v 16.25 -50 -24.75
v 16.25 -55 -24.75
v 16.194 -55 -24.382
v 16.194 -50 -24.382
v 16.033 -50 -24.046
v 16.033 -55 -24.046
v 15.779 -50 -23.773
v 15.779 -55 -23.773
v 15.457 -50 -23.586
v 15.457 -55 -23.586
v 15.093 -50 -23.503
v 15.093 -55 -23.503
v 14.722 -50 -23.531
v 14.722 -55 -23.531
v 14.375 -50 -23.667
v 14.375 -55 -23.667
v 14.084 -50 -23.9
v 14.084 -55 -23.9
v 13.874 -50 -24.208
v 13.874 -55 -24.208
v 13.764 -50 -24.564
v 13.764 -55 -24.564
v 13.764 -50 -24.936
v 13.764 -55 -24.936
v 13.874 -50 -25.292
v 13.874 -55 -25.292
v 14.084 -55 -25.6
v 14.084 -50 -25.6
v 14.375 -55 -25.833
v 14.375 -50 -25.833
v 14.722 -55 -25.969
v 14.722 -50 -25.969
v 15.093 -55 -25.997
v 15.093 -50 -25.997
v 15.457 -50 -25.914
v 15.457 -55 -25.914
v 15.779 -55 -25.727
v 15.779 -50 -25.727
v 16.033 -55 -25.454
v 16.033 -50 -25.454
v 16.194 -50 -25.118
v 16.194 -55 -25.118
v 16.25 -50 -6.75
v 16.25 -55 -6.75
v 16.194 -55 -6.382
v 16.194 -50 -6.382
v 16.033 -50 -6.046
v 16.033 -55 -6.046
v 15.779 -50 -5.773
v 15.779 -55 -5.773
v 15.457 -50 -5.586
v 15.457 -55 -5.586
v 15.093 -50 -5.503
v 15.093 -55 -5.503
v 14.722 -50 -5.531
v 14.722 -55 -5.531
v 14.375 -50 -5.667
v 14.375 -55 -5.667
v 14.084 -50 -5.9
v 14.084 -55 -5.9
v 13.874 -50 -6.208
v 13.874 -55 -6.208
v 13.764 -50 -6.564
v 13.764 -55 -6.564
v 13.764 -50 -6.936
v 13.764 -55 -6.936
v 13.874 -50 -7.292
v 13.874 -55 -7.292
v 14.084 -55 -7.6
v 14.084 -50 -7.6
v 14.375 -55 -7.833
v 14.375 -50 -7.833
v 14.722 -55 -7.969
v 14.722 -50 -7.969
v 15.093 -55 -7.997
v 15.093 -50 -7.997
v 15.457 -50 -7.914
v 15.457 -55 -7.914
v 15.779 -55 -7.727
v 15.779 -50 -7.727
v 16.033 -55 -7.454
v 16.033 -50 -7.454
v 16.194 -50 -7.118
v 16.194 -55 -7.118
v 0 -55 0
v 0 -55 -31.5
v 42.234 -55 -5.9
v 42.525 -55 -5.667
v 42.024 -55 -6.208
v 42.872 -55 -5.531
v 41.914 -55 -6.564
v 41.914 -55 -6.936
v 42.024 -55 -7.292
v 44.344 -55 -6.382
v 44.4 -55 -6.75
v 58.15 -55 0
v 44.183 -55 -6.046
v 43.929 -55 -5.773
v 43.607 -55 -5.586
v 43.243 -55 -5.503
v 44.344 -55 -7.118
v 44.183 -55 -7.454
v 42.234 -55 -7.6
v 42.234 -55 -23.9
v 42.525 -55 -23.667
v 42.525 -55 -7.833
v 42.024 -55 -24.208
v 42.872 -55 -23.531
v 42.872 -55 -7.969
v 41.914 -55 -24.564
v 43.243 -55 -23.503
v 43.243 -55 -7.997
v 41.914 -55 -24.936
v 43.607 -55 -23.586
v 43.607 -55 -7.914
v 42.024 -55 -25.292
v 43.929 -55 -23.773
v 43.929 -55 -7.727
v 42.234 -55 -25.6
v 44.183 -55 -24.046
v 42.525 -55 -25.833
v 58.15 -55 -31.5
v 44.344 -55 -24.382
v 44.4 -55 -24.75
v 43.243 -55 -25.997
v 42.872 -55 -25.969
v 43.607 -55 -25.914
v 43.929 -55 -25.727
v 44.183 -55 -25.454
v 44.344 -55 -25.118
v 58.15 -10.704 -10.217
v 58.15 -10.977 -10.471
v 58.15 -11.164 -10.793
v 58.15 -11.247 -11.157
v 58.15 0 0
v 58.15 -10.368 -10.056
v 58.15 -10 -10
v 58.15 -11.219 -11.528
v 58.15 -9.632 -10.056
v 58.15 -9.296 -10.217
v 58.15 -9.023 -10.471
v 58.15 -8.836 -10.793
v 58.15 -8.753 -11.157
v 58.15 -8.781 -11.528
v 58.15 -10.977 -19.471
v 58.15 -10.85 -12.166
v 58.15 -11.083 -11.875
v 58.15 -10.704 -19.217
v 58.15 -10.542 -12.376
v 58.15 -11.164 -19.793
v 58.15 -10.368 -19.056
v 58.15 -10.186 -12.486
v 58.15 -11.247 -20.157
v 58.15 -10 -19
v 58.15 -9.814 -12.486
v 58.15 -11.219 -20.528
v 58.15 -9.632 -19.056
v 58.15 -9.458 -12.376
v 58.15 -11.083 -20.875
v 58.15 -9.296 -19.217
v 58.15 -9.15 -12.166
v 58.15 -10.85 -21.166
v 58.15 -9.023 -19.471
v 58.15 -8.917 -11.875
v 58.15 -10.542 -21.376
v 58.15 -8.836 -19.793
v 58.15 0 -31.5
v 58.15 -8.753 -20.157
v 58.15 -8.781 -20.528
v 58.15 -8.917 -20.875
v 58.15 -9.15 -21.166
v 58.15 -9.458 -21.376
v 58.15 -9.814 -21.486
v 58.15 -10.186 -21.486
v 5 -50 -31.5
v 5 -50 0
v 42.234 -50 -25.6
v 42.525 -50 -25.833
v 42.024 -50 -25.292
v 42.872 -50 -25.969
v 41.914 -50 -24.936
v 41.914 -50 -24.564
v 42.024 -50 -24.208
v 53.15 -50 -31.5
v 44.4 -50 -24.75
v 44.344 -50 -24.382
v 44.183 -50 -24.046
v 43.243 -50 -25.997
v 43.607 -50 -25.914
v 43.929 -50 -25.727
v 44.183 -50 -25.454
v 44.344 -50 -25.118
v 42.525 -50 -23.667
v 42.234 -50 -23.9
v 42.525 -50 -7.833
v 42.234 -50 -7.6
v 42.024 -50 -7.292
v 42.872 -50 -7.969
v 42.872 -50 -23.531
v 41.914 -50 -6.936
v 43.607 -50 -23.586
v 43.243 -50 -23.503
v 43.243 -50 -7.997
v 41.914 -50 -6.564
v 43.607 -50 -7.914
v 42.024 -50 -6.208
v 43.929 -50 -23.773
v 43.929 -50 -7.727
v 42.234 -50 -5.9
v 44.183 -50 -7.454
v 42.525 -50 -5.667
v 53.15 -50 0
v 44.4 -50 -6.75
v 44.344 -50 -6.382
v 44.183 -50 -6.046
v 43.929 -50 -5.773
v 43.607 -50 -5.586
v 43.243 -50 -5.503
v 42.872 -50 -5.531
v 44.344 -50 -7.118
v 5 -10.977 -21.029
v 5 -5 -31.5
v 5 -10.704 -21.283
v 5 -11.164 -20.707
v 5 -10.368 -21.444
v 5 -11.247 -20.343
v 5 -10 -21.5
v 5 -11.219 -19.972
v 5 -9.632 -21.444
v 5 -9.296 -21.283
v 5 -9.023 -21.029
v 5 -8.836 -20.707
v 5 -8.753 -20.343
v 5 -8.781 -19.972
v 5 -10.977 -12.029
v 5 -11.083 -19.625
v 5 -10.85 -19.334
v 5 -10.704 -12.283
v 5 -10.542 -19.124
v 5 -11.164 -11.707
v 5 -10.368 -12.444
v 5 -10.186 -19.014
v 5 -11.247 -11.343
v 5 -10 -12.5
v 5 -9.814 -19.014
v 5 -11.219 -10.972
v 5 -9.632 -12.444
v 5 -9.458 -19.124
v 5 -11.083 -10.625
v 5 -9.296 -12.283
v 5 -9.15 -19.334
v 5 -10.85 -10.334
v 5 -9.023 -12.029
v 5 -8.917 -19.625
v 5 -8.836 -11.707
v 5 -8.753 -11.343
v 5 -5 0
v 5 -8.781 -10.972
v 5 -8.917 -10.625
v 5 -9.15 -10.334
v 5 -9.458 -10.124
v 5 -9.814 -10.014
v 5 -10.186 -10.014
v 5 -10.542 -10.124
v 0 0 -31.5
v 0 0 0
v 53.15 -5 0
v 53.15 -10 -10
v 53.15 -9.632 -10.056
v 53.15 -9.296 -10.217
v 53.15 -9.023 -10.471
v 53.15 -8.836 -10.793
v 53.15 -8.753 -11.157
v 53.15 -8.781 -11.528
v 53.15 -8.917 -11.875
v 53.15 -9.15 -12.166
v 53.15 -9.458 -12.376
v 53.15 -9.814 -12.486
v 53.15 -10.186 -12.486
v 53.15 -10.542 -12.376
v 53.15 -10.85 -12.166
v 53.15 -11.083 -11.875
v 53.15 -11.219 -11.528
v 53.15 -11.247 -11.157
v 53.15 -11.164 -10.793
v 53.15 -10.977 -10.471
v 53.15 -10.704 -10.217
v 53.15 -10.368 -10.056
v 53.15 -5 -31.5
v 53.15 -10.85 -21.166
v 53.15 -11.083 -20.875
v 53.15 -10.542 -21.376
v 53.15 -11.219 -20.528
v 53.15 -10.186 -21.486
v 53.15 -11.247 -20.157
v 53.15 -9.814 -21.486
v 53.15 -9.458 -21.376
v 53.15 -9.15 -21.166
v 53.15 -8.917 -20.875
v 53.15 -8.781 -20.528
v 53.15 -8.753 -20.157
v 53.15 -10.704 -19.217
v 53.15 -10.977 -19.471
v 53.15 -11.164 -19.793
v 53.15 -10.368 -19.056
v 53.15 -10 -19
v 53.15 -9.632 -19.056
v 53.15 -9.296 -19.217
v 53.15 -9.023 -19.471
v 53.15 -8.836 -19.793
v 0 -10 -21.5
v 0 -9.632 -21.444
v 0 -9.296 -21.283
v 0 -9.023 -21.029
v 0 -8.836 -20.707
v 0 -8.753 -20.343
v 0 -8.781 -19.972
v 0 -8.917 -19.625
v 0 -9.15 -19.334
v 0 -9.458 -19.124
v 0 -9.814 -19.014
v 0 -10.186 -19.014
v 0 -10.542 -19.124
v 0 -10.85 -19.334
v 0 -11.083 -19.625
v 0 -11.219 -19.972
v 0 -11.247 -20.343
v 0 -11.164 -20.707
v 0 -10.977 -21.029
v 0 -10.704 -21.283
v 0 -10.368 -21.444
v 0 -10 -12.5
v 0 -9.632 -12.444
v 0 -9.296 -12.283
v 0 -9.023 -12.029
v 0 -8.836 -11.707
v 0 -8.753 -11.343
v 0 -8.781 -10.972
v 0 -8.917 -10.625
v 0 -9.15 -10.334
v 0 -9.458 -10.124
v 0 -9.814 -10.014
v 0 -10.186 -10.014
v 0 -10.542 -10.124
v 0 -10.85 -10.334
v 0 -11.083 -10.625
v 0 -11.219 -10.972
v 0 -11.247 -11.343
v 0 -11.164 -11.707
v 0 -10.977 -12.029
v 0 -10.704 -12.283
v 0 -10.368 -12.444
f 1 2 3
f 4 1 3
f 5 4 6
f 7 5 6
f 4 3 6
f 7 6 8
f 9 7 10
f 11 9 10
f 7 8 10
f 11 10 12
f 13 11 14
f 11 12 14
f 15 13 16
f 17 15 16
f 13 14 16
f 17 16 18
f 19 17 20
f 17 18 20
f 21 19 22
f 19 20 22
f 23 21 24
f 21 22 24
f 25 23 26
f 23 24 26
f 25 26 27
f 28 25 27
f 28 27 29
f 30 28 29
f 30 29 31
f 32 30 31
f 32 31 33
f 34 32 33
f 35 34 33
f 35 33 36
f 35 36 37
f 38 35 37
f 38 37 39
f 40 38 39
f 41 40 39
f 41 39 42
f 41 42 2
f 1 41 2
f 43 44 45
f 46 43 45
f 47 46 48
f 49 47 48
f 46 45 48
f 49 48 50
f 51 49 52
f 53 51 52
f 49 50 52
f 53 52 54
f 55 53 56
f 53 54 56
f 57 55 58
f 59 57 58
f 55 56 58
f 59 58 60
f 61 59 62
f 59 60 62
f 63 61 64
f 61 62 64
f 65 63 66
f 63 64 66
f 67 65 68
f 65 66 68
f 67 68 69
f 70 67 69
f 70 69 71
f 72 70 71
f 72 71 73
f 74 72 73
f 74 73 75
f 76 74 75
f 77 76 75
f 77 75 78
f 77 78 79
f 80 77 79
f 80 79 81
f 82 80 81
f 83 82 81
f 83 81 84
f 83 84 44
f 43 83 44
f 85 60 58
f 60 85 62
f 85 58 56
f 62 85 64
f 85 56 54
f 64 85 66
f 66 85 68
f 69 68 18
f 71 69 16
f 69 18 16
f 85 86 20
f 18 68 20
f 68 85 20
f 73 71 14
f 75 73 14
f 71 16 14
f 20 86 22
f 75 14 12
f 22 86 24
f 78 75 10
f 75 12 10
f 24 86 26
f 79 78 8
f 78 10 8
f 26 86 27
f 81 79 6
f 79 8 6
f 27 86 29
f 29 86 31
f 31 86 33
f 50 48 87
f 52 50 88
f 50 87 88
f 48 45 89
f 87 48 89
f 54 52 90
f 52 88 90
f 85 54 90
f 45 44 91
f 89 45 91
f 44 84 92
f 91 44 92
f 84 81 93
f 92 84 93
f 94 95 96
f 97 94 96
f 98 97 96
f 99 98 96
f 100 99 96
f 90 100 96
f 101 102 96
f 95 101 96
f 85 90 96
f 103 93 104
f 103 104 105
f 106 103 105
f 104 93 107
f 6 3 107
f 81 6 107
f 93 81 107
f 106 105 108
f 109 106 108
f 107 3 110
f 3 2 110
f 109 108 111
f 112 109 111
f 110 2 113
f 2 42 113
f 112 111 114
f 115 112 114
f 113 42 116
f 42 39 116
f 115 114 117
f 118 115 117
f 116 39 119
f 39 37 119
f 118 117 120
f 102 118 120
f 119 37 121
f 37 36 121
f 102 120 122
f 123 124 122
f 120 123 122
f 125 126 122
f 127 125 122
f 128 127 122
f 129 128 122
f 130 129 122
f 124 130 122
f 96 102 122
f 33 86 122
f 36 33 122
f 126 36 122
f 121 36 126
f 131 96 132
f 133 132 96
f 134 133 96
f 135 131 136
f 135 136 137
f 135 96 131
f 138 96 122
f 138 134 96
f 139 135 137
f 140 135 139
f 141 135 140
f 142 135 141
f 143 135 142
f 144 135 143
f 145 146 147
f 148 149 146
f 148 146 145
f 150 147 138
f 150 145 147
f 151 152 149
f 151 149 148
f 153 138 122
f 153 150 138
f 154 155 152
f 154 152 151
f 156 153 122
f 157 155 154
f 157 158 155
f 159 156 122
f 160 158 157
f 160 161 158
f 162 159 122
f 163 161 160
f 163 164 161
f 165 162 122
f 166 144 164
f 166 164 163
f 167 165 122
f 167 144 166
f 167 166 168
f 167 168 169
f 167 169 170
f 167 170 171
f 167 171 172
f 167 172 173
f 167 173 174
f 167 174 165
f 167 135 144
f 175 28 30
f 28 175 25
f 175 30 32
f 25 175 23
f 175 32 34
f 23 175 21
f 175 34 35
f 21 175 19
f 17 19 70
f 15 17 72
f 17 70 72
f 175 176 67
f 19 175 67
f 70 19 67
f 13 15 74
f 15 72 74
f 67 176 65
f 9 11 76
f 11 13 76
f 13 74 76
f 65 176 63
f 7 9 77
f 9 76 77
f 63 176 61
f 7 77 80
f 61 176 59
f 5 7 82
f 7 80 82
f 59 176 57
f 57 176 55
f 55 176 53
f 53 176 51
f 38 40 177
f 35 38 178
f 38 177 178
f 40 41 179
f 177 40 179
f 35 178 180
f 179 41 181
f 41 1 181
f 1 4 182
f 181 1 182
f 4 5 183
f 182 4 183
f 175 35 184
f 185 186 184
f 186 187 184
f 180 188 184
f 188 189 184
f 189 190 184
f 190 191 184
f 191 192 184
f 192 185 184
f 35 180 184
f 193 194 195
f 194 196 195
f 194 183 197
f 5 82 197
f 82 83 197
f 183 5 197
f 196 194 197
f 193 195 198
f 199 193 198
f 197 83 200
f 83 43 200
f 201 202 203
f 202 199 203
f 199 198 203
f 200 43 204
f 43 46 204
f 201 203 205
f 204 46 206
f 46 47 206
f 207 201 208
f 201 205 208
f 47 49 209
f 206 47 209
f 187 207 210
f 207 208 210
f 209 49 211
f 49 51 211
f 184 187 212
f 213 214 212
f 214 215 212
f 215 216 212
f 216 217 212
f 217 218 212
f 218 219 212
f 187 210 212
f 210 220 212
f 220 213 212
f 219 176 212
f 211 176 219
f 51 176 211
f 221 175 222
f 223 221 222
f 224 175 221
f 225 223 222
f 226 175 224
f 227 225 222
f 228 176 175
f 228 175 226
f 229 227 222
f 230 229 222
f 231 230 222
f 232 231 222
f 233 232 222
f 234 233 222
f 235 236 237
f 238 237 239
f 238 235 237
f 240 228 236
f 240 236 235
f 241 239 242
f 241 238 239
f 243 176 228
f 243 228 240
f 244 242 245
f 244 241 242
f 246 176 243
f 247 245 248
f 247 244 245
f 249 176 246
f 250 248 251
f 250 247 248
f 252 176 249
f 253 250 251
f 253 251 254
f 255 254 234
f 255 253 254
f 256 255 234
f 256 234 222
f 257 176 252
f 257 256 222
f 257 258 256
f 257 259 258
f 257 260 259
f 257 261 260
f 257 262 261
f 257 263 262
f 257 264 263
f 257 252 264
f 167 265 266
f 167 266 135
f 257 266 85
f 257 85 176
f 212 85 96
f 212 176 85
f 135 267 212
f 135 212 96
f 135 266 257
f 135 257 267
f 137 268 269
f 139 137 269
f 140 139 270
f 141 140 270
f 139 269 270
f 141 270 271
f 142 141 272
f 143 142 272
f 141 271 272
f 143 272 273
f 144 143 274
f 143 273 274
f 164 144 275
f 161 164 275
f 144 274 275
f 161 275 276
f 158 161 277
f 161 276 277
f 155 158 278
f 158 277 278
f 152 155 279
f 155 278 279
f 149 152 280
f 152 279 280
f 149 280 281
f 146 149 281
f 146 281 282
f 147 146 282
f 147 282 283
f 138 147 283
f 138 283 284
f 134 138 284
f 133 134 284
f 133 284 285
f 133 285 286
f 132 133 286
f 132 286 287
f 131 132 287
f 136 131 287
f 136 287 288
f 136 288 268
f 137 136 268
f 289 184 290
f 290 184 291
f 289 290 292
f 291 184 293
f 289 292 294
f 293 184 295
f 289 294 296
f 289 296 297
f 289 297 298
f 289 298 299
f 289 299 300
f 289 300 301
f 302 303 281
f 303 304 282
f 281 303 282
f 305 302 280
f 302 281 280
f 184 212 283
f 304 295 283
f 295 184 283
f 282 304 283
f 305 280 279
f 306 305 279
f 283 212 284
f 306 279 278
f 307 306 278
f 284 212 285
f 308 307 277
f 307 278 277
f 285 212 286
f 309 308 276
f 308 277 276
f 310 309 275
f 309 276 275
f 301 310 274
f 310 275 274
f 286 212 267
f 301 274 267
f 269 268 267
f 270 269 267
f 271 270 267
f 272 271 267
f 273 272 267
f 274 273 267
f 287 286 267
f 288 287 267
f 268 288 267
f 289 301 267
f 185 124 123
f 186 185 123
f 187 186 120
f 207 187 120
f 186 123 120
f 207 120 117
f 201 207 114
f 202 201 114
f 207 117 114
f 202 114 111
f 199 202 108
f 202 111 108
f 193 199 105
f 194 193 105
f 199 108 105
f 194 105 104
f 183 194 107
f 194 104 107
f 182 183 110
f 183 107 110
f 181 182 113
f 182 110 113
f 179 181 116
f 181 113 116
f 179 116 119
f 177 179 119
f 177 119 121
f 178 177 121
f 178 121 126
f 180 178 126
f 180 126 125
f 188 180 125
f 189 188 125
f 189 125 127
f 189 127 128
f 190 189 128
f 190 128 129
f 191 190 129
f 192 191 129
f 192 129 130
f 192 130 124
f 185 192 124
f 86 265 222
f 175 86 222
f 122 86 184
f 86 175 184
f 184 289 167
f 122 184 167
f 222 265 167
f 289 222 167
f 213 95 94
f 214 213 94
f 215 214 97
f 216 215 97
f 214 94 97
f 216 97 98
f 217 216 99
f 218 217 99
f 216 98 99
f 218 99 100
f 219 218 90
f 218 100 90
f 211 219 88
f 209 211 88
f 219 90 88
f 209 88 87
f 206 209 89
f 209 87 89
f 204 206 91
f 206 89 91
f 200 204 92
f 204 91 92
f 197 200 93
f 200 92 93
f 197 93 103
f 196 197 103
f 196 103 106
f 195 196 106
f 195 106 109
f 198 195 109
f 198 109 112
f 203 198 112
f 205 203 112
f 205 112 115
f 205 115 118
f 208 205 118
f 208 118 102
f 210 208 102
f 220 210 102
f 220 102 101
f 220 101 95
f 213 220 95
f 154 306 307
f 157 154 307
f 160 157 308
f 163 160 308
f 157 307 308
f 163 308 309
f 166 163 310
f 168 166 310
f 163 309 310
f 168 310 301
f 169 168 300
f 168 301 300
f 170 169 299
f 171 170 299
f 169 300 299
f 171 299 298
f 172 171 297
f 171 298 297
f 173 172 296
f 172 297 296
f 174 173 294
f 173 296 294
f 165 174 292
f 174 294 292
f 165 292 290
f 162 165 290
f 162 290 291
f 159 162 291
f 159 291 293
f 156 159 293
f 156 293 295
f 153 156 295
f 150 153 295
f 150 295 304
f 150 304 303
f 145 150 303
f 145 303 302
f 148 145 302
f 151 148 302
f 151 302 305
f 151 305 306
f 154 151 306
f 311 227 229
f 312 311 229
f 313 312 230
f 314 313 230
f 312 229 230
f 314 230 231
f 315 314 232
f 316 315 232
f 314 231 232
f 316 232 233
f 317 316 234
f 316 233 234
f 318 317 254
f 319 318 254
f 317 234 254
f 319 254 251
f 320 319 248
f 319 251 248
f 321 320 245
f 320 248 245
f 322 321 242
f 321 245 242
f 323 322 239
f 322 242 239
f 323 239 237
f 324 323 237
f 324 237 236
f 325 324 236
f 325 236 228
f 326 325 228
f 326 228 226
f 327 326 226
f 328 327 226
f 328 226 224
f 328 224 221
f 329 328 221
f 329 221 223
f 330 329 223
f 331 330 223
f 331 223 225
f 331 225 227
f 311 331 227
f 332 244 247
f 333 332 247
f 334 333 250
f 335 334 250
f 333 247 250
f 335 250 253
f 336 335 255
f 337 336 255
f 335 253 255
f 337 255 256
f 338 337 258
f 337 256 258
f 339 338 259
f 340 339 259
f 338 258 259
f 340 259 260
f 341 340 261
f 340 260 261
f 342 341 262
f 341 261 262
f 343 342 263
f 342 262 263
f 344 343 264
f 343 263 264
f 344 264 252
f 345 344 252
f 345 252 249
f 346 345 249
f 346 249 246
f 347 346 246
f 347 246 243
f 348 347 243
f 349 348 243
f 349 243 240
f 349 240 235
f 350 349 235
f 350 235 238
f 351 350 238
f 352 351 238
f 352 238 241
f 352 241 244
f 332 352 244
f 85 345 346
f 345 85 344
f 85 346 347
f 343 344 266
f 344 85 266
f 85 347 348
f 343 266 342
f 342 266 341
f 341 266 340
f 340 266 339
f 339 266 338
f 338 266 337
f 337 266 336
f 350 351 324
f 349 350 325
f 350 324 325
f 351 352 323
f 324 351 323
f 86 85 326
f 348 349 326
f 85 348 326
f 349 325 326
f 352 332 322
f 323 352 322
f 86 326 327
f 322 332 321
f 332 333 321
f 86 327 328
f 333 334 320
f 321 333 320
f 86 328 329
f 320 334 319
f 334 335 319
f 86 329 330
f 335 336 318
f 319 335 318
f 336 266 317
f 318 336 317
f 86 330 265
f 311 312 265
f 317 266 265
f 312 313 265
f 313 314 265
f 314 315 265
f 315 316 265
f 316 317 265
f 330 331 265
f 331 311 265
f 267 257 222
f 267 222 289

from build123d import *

# Parameters (mm, degrees)
SKETCH_1_W          = 58.15
SKETCH_1_H          = 31.5
EXTRUDE_1_DEPTH     = 55
SKETCH_2_W          = 48.15
SKETCH_2_H          = 45
CUT_EXTRUDE_1_DEPTH = 31.5
SKETCH_4_R          = 1.25
CUT_EXTRUDE_2_DEPTH = 10
SKETCH_5_R          = 1.25
CUT_EXTRUDE_3_DEPTH = 10
SKETCH_6_R          = 1.25
CUT_EXTRUDE_4_DEPTH = 10


with BuildPart() as part:
    # 草图1 → 凸台-拉伸1 (new body)
    with BuildSketch(Plane(origin=(0, 0, 0), x_dir=(1, 0, 0), z_dir=(0, 1, 0))):
        with Locations((29.075, 15.75)):
            Rectangle(SKETCH_1_W, SKETCH_1_H)
    extrude(amount=-EXTRUDE_1_DEPTH)

    # 草图2 → 切除-拉伸1 (cut)
    with BuildSketch(Plane.XY):
        with Locations((29.075, -27.5)):
            Rectangle(SKETCH_2_W, SKETCH_2_H)
    extrude(amount=-CUT_EXTRUDE_1_DEPTH, mode=Mode.SUBTRACT)

    # 草图4 → 切除-拉伸2 (cut)
    with BuildSketch(Plane.XZ.offset(55)):
        with Locations((15, -6.75)):
            Circle(SKETCH_4_R)
        with Locations((15, -24.75)):
            Circle(SKETCH_4_R)
        with Locations((43.15, -6.75)):
            Circle(SKETCH_4_R)
        with Locations((43.15, -24.75)):
            Circle(SKETCH_4_R)
    extrude(amount=-CUT_EXTRUDE_2_DEPTH, mode=Mode.SUBTRACT)

    # 草图5 → 切除-拉伸3 (cut)
    with BuildSketch(Plane.ZY.offset(-53.15)):
        with Locations((-20.25, -10)):
            Circle(SKETCH_5_R)
        with Locations((-11.25, -10)):
            Circle(SKETCH_5_R)
    extrude(amount=-CUT_EXTRUDE_3_DEPTH, mode=Mode.SUBTRACT)

    # 草图6 → 切除-拉伸4 (cut)
    with BuildSketch(Plane(origin=(5, 0, 0), x_dir=(0, 0, -1), z_dir=(1, 0, 0))):
        with Locations((11.25, -10)):
            Circle(SKETCH_6_R)
        with Locations((20.25, -10)):
            Circle(SKETCH_6_R)
    extrude(amount=-CUT_EXTRUDE_4_DEPTH, mode=Mode.SUBTRACT)


solid = part.part
